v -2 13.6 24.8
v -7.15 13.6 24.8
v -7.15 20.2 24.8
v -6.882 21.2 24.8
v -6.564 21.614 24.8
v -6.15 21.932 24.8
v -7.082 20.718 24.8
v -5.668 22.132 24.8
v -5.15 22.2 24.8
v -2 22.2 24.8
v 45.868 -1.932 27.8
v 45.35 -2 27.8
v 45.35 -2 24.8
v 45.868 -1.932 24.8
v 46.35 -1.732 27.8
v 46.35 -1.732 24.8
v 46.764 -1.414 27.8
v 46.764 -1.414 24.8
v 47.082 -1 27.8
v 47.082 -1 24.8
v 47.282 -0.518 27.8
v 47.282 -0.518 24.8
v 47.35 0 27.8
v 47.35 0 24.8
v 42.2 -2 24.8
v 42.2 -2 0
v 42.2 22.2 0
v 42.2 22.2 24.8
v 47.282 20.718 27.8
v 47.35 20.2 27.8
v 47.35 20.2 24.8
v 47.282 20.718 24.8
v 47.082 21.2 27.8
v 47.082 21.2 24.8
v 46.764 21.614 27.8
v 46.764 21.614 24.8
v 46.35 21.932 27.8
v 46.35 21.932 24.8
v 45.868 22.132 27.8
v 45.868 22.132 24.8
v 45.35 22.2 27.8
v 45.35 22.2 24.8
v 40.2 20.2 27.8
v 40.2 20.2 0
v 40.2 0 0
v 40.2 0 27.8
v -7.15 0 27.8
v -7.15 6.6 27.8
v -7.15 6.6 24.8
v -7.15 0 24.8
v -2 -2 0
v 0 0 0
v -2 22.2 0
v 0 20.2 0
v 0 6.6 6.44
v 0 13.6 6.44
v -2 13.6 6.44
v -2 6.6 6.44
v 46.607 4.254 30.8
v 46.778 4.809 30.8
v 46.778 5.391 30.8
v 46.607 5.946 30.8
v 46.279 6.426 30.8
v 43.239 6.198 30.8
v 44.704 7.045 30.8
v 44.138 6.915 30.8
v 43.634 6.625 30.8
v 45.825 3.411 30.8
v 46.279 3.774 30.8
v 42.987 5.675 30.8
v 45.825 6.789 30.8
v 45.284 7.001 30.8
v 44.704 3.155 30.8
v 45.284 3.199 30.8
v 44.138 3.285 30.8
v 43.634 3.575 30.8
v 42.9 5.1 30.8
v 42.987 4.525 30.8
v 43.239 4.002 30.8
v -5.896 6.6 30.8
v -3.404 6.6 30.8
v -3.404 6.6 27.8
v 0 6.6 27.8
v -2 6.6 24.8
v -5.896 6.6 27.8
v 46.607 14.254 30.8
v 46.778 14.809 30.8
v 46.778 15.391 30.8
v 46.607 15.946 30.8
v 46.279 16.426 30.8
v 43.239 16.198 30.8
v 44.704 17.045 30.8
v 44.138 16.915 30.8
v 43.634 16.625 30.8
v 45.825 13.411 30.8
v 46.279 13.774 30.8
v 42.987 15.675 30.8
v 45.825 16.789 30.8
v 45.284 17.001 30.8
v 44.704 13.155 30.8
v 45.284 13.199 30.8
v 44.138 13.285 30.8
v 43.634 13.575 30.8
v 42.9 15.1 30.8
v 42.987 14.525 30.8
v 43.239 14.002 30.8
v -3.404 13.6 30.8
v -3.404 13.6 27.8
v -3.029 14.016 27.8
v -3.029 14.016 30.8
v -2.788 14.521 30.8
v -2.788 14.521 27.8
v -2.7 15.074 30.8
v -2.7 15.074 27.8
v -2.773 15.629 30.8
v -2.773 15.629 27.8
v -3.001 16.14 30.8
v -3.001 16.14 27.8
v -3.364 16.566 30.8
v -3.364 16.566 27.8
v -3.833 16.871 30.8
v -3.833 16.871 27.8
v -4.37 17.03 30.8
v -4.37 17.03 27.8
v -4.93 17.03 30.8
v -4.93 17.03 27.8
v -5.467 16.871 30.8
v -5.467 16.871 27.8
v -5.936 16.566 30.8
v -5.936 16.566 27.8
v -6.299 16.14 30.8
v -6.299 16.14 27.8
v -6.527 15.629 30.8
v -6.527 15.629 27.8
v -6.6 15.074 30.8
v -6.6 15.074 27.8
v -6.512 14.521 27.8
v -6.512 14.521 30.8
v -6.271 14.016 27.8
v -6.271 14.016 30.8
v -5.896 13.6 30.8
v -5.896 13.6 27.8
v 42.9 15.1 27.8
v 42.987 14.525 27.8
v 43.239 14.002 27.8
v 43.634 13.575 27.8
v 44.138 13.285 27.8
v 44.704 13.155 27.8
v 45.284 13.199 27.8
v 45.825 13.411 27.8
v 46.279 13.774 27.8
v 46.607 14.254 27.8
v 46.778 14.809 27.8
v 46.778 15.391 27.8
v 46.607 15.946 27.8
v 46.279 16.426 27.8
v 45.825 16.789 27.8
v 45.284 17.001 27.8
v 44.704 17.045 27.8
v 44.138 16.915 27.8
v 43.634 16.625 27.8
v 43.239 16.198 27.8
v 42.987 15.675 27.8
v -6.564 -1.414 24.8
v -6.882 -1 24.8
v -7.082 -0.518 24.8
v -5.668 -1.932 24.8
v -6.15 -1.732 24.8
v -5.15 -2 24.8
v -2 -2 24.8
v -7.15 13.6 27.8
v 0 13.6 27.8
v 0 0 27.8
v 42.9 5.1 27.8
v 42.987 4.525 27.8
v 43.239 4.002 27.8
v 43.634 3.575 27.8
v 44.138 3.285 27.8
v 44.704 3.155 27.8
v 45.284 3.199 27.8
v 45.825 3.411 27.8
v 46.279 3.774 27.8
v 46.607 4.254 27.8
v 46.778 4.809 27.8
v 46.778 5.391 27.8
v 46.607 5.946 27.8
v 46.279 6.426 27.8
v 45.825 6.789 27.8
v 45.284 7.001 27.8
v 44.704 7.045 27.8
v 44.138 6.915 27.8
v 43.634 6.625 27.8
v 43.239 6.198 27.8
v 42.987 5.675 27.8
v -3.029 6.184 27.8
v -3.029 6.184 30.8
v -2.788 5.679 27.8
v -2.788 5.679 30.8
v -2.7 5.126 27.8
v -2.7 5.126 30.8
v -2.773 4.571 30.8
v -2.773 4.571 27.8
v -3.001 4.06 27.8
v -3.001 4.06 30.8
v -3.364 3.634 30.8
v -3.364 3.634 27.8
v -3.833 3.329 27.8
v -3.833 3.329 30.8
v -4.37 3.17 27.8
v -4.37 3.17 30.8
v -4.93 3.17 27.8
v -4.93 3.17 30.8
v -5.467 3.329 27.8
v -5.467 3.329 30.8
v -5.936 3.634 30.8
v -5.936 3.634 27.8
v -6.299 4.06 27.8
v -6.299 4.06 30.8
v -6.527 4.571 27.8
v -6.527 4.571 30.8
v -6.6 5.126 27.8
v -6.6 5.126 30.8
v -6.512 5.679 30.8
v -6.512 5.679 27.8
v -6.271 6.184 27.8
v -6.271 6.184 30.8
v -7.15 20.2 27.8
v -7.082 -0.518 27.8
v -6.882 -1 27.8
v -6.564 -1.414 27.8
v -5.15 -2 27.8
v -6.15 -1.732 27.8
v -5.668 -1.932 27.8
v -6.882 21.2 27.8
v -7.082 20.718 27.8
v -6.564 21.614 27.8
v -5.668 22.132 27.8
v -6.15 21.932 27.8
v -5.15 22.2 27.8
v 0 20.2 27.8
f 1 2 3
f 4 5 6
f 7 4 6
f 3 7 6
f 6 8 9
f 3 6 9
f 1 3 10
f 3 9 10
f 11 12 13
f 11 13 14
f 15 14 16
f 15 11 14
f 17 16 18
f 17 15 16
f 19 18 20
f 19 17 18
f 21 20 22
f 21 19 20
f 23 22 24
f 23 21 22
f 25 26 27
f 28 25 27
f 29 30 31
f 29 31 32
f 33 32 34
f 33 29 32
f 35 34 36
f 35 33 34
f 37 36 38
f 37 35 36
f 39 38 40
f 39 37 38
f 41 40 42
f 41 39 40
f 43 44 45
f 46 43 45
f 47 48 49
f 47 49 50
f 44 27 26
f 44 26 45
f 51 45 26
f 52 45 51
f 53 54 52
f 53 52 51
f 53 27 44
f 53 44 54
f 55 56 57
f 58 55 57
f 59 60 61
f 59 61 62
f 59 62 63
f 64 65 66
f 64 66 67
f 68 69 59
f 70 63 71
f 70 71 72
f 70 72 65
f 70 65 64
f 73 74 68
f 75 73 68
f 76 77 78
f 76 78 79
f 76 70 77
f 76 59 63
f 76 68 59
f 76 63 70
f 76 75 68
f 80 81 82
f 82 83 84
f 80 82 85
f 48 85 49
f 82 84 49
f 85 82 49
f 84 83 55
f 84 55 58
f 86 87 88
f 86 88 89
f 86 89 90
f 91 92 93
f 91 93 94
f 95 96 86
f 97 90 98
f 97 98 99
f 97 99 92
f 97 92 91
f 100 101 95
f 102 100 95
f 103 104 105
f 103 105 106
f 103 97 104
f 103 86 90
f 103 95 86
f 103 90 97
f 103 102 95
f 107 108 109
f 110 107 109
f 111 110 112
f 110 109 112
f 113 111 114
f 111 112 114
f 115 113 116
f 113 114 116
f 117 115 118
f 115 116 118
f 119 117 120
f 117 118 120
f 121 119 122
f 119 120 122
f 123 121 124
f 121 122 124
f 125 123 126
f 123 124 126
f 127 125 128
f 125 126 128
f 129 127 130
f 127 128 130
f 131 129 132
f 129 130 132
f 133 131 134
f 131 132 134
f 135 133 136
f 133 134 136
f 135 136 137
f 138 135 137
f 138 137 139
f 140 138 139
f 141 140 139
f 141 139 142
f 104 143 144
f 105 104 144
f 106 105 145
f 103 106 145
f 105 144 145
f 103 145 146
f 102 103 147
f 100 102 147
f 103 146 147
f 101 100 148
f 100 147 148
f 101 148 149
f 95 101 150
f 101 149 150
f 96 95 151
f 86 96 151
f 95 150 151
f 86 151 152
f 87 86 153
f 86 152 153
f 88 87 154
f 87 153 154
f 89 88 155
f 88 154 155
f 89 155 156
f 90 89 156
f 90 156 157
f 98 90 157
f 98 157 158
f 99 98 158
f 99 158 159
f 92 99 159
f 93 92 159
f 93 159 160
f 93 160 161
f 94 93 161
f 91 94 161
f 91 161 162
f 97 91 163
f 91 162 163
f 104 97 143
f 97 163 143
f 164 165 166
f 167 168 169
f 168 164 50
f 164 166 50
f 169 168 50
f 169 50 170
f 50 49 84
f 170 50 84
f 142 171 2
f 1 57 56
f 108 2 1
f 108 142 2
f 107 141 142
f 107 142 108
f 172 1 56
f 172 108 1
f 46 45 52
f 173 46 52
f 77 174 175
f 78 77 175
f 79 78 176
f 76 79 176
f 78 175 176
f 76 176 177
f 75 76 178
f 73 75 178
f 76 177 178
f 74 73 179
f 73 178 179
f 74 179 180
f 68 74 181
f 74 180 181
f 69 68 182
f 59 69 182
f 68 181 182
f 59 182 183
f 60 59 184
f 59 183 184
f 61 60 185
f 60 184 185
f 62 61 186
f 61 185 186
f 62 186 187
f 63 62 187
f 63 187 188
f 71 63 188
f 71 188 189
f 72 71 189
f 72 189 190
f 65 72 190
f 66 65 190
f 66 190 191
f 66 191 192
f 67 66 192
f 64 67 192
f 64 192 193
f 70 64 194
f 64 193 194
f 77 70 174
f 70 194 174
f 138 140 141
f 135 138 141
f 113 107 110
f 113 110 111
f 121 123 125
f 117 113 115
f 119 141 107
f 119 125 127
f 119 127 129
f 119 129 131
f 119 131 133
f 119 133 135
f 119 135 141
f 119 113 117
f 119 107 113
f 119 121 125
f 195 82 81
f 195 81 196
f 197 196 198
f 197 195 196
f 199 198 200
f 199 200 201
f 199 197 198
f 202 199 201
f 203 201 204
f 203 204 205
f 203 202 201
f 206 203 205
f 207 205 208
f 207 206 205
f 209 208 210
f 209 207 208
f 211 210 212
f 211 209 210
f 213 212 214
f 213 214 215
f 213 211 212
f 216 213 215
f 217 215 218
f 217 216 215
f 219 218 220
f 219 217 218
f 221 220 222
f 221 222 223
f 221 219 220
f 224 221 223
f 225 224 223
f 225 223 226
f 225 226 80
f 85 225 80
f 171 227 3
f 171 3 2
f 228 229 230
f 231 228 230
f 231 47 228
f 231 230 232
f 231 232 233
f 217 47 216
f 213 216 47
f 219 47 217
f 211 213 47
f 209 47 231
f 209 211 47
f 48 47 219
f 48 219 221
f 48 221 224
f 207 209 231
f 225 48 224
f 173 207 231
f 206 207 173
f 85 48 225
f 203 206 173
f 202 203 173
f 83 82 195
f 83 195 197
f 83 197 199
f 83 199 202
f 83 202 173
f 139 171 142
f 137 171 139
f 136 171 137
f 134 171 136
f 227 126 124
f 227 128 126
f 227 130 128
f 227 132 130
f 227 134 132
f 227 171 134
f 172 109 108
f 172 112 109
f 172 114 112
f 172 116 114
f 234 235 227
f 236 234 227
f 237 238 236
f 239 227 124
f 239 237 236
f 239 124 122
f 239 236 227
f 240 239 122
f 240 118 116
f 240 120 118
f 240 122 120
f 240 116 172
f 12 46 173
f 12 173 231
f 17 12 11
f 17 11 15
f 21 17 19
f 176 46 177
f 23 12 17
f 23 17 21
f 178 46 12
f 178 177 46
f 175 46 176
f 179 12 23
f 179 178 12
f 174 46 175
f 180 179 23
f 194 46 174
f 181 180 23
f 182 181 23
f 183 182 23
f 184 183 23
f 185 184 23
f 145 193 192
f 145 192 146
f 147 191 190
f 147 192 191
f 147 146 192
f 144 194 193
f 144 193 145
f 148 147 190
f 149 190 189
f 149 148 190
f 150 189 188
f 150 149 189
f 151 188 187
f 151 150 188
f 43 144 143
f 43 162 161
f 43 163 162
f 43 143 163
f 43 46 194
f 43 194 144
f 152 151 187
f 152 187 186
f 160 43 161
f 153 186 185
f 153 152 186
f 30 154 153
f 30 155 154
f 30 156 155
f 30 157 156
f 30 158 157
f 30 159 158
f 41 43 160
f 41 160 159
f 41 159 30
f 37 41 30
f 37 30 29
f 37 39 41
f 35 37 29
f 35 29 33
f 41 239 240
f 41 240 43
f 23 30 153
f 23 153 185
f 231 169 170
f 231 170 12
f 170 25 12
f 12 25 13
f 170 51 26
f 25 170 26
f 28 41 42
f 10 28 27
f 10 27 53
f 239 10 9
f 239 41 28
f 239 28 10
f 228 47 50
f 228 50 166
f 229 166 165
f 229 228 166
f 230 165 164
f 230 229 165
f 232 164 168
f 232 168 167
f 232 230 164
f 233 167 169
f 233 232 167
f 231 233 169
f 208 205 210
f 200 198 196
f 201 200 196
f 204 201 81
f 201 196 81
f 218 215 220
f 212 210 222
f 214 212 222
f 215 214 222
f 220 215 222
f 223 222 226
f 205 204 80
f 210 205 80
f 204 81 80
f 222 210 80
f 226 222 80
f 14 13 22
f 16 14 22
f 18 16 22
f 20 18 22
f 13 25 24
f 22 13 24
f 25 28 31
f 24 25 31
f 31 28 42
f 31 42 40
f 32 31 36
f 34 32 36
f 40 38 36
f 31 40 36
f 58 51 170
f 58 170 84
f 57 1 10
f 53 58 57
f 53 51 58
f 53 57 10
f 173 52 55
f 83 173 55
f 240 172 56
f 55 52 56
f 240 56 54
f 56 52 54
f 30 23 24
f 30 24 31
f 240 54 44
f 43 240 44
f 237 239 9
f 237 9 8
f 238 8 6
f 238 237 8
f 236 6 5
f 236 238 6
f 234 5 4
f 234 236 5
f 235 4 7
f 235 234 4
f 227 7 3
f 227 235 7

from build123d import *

# Parameters (mm, degrees)
BOSS_EXTRU_1_DEPTH = 27.8
ESQUISSE3_W        = 2
ESQUISSE3_H        = 7
BOSS_EXTRU_2_DEPTH = 6.44
BOSS_EXTRU_3_DEPTH = 3
ESQUISSE7_R        = 1.95
BOSS_EXTRU_4_DEPTH = 3


with BuildPart() as part:
    # Esquisse1 → Boss.-Extru.1 (new body)
    with BuildSketch(Plane.XY):
        Polygon((-2, 22.2), (-2, 13.6), (0, 13.6), (0, 20.2), (40.2, 20.2), (40.2, 0), (0, 0), (0, 6.6), (-2, 6.6), (-2, -2), (42.2, -2), (42.2, 22.2), align=None)
    extrude(amount=BOSS_EXTRU_1_DEPTH)

    # Esquisse3 → Boss.-Extru.2 (add)
    with BuildSketch(Plane(origin=(0, 0, 0), x_dir=(-1, 0, 0), z_dir=(0, 0, -1))):
        with Locations((1, 10.1)):
            Rectangle(ESQUISSE3_W, ESQUISSE3_H)
    extrude(amount=-BOSS_EXTRU_2_DEPTH)

    # Esquisse5 → Boss.-Extru.3 (add)
    with BuildSketch(Plane.XY.offset(27.8)):
        with BuildLine():
            Line((-2, 13.6), (-2, 22.2))
            Line((-2, 22.2), (-5.15, 22.2))
            ThreePointArc((-5.15, 22.2), (-6.564213562, 21.614213562), (-7.15, 20.2))
            Line((-7.15, 20.2), (-7.15, 13.6))
            Line((-7.15, 13.6), (-2, 13.6))
        make_face()
        with BuildLine():
            Line((-2, -2), (-2, 6.6))
            Line((-2, 6.6), (-7.15, 6.6))
            Line((-7.15, 6.6), (-7.15, 0))
            ThreePointArc((-7.15, 0), (-6.564213562, -1.414213562), (-5.15, -2))
            Line((-5.15, -2), (-2, -2))
        make_face()
        with BuildLine():
            Line((42.2, -2), (45.35, -2))
            ThreePointArc((45.35, -2), (46.764213562, -1.414213562), (47.35, 0))
            Line((47.35, 0), (47.35, 20.2))
            ThreePointArc((47.35, 20.2), (46.764213562, 21.614213562), (45.35, 22.2))
            Line((45.35, 22.2), (42.2, 22.2))
            Line((42.2, 22.2), (42.2, -2))
        make_face()
    extrude(amount=-BOSS_EXTRU_3_DEPTH)

    # Esquisse7 → Boss.-Extru.4 (add)
    with BuildSketch(Plane.XY.offset(27.8)):
        with Locations(Location((44.85, 5.1, 0), (0, 0, 180))):
            Circle(ESQUISSE7_R)
        with Locations(Location((44.85, 15.1, 0), (0, 0, 180))):
            Circle(ESQUISSE7_R)
        with BuildLine():
            Line((-5.895993579, 13.6), (-3.404006421, 13.6))
            ThreePointArc((-3.404006421, 13.6), (-4.65, 17.05), (-5.895993579, 13.6))
        make_face()
        with BuildLine():
            Line((-5.895993579, 6.6), (-3.404006421, 6.6))
            ThreePointArc((-3.404006421, 6.6), (-4.65, 3.15), (-5.895993579, 6.6))
        make_face()
    extrude(amount=BOSS_EXTRU_4_DEPTH)


solid = part.part
